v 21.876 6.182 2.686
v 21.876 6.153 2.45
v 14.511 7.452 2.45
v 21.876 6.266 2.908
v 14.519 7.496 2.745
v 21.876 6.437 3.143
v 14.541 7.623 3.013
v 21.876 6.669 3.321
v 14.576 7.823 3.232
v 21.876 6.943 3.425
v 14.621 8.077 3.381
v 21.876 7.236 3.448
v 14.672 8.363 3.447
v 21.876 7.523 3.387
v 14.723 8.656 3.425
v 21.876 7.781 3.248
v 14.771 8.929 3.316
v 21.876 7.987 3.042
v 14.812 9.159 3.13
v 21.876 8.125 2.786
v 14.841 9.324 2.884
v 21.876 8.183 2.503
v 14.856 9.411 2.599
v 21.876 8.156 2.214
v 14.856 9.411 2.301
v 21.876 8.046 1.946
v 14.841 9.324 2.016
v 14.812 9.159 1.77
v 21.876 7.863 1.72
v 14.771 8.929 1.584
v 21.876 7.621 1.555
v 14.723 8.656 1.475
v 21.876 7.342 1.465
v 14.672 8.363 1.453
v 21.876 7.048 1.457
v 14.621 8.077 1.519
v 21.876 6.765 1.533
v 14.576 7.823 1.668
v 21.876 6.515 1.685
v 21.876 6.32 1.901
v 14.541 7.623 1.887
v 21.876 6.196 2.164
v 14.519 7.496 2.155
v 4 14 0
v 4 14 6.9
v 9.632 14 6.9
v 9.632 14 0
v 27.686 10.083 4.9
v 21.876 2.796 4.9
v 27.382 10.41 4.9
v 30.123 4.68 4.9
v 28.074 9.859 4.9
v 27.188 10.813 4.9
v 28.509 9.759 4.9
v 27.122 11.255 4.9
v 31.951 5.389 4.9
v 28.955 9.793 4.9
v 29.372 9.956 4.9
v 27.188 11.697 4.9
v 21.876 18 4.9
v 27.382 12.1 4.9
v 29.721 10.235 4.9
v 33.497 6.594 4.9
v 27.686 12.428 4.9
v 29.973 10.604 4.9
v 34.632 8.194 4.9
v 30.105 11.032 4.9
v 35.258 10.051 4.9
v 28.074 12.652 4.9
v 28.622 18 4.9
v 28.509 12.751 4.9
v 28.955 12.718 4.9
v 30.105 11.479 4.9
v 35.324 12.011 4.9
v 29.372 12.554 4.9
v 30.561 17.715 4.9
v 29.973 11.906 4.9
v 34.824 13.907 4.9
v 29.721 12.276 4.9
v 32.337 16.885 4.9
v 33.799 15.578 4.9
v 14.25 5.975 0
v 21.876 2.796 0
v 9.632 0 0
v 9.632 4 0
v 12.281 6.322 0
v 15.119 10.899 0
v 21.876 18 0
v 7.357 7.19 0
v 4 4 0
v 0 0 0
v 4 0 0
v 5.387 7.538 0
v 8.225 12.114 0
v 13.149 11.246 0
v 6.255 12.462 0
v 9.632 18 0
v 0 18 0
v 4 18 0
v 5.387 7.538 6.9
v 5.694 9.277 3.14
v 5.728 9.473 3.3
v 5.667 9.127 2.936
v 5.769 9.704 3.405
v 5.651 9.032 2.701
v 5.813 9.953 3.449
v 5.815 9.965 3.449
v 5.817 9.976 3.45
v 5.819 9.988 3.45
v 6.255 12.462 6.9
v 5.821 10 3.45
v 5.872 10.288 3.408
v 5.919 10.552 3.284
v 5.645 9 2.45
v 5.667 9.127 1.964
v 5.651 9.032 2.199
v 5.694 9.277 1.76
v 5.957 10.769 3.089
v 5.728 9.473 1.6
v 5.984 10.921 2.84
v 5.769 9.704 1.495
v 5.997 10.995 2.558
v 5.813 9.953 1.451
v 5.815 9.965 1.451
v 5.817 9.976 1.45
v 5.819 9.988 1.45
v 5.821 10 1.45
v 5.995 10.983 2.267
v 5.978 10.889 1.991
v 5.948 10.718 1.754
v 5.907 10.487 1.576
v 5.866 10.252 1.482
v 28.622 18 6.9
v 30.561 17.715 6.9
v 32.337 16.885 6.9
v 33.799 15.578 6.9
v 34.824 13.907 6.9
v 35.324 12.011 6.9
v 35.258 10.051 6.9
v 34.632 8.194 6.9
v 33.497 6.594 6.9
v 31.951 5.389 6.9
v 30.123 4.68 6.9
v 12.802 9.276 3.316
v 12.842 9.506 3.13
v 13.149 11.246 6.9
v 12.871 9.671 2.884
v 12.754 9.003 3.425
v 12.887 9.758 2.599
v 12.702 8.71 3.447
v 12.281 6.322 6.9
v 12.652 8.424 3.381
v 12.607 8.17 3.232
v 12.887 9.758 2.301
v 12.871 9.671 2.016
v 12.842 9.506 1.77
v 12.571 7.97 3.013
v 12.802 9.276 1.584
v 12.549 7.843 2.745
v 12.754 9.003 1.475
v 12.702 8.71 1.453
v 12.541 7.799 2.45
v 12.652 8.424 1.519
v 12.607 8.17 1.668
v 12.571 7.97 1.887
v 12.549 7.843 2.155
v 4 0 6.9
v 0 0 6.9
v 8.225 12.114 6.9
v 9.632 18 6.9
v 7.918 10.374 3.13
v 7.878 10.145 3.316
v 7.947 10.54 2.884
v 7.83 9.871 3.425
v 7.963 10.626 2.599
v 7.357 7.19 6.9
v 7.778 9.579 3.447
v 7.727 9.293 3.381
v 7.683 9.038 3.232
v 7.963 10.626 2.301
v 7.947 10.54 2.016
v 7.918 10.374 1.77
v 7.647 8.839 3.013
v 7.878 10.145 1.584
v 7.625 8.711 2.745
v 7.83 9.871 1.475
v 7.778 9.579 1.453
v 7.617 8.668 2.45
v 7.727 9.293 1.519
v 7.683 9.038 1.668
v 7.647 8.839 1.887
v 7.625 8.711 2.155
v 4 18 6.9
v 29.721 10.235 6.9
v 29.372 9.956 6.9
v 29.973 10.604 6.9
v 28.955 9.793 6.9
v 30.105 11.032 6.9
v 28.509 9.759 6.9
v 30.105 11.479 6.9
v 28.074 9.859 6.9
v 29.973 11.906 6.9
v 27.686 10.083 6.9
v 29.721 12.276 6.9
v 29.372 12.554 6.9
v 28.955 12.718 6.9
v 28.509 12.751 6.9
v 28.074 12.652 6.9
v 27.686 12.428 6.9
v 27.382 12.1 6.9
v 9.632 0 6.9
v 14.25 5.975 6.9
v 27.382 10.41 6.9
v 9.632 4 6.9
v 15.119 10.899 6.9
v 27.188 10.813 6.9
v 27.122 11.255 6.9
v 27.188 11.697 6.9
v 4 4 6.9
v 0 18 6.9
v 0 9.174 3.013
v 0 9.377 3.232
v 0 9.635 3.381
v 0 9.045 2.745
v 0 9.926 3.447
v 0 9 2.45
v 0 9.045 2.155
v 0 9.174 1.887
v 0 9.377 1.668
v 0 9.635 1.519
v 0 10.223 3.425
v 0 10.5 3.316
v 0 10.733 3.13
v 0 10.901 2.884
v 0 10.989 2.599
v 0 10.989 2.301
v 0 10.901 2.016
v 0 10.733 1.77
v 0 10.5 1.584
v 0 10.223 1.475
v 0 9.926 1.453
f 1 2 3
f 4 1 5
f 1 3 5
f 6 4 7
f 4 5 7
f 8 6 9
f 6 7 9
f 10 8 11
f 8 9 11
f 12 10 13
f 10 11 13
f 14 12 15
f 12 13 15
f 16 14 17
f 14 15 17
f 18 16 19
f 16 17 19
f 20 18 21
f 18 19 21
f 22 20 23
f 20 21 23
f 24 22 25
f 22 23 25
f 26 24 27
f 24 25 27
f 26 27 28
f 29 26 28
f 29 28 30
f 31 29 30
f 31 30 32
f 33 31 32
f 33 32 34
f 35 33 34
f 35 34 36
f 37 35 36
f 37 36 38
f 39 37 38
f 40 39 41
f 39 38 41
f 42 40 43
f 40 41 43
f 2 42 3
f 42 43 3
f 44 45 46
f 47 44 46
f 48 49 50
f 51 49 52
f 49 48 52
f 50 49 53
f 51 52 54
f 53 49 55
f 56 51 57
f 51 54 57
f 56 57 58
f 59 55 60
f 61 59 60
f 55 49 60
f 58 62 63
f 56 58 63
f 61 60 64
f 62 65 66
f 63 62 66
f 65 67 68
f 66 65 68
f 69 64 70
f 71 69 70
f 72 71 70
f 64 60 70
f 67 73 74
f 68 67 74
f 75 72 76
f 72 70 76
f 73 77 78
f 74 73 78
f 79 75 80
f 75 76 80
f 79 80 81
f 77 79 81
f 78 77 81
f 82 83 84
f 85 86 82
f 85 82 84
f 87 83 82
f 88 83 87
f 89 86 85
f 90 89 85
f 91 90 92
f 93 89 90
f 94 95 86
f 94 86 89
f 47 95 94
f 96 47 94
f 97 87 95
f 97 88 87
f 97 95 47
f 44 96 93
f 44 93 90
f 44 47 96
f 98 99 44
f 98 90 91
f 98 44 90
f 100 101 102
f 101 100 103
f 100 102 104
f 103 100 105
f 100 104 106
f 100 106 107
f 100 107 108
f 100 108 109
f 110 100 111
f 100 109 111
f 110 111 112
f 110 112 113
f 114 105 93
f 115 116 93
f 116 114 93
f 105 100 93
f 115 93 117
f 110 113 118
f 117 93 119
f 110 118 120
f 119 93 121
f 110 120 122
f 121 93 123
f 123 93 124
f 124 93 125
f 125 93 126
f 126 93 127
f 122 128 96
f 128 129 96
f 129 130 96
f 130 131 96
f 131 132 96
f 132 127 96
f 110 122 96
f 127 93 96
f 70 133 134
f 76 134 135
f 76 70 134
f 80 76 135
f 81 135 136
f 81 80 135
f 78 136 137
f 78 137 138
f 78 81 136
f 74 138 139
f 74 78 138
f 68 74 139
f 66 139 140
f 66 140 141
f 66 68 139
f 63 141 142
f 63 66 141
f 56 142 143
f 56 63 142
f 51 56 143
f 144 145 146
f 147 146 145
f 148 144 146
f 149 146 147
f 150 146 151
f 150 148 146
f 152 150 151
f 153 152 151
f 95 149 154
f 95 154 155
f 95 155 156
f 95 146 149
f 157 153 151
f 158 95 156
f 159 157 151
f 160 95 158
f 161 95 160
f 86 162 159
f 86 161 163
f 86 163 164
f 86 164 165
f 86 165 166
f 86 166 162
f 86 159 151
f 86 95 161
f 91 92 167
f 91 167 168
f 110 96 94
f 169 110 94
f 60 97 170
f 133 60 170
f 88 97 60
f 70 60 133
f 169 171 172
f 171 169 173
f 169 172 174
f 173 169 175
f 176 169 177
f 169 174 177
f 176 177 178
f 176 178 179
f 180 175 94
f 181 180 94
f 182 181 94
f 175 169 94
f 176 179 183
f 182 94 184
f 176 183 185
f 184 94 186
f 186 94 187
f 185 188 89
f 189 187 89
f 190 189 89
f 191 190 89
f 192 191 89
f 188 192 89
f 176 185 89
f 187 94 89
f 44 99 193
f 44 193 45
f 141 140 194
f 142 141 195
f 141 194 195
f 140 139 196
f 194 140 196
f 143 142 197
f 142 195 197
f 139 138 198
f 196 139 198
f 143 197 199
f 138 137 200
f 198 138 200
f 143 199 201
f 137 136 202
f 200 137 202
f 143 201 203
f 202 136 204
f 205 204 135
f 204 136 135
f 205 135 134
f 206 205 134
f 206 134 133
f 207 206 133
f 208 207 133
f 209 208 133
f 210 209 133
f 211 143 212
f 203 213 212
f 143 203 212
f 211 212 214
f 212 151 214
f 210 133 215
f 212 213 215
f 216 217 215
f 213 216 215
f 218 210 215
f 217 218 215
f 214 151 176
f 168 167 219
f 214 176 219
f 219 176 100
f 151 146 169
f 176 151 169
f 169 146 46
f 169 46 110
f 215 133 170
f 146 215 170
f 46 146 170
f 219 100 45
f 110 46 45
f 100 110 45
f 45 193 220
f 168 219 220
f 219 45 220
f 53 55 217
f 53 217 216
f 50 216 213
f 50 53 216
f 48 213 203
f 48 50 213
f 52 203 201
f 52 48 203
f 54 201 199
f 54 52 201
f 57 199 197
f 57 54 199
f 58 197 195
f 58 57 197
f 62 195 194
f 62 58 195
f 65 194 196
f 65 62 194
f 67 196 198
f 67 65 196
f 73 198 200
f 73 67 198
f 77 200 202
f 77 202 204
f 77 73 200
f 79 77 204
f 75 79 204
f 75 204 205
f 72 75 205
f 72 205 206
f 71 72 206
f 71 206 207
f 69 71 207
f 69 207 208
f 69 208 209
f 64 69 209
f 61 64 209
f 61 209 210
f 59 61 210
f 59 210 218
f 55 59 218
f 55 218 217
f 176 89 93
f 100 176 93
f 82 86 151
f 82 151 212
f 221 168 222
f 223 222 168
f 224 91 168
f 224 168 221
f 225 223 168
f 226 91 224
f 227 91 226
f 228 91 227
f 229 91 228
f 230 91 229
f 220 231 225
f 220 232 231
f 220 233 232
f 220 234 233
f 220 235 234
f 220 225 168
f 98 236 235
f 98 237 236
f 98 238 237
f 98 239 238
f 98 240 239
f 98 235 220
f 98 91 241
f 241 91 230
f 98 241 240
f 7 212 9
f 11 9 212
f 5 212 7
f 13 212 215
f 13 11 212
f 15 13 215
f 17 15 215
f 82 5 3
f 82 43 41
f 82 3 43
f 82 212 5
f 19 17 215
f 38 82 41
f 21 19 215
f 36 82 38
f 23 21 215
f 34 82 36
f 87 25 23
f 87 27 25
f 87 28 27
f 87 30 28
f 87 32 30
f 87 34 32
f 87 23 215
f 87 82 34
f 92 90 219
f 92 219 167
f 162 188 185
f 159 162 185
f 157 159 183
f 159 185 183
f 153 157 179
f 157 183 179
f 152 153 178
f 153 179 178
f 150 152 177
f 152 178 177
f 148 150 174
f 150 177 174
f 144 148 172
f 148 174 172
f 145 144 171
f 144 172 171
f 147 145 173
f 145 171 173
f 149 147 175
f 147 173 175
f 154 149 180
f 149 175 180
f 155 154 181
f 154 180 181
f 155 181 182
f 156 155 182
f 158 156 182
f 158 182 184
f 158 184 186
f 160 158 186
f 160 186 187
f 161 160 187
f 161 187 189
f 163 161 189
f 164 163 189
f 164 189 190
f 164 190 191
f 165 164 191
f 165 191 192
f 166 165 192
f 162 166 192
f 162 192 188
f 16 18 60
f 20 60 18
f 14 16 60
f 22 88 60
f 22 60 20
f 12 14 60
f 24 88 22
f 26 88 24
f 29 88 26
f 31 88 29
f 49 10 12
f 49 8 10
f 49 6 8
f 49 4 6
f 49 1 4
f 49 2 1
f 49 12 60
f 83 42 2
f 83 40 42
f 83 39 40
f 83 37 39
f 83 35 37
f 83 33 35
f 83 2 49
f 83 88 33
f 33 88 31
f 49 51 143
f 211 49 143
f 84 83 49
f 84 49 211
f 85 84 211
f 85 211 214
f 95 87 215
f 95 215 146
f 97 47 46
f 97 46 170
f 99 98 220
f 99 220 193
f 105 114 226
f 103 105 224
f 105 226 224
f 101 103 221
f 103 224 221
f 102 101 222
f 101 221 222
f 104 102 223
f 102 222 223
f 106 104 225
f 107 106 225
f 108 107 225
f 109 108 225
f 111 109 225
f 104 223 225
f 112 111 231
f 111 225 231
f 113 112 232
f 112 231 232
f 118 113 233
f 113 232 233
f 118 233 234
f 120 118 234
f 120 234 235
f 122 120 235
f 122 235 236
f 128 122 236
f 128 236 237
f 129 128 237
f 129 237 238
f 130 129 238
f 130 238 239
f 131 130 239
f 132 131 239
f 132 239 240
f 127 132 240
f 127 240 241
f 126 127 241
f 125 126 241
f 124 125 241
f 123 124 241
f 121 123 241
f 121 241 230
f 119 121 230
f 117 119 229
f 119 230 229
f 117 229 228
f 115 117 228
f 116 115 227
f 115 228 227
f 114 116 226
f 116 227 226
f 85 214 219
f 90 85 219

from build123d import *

# Parameters (mm, degrees)
SKETCH1_R                           = 1.5
BOSS_EXTRUDE1_DEPTH                 = 6.9
CUT_EXTRUDE2_DEPTH                  = 4.9
SKETCH5_R                           = 1
CUT_EXTRUDE3_DEPTH                  = 7
CUT_EXTRUDE4_REACH                  = 37.751
SKETCH6_R                           = 1
CUT_EXTRUDE4_DIRECTION_2_REACH      = 37.751
CUT_EXTRUDE4_DIRECTION_2_END_RADIUS = 1


with BuildPart() as part:
    # Sketch1 → Boss-Extrude1 (new body)
    with BuildSketch(Plane.XY):
        with BuildLine():
            Line((0, 0), (0, 18.000341084))
            Line((0, 18.000341084), (4, 18.000341084))
            Line((4, 18.000341084), (4, 14.000341084))
            Line((4, 14.000341084), (9.631516349, 14.000341084))
            Line((9.631516349, 14.000341084), (9.631516349, 18.000341084))
            Line((9.631516349, 18.000341084), (28.621516349, 18.000341084))
            ThreePointArc((28.621516349, 18.000341084), (35.324106187, 12.010882781), (30.123176491, 4.679535592))
            Line((30.123176491, 4.679535592), (9.631516349, 0))
            Line((9.631516349, 0), (9.631516349, 4))
            Line((9.631516349, 4), (4, 4))
            Line((4, 4), (4, 0))
            Line((4, 0), (0, 0))
        make_face()
        with Locations((28.621516349, 11.255296941)):
            Circle(SKETCH1_R, mode=Mode.SUBTRACT)
        Polygon((14.250450019, 5.974769403), (15.118690908, 10.898808168), (13.149075402, 11.246104524), (12.280834513, 6.322065759), align=None, mode=Mode.SUBTRACT)
        Polygon((6.255421131, 12.461641767), (8.225036637, 12.114345412), (7.356795748, 7.190306647), (5.387180242, 7.537603002), align=None, mode=Mode.SUBTRACT)
    extrude(amount=BOSS_EXTRUDE1_DEPTH)

    # Sketch4 → Cut-Extrude2 (cut)
    with BuildSketch(Plane.XY):
        with BuildLine():
            Line((21.876472206, 2.796294022), (30.123176491, 4.679535592))
            ThreePointArc((30.123176491, 4.679535592), (35.324106187, 12.010882781), (28.621516349, 18.000341084))
            Line((28.621516349, 18.000341084), (21.876472206, 18.000341084))
            Line((21.876472206, 18.000341084), (21.876472206, 2.796294022))
        make_face()
    extrude(amount=CUT_EXTRUDE2_DEPTH, mode=Mode.SUBTRACT)

    # Sketch5 → Cut-Extrude3 (cut)
    with BuildSketch(Plane.ZY):
        with Locations((2.45, 10.000341084)):
            Circle(SKETCH5_R)
    extrude(amount=-CUT_EXTRUDE3_DEPTH, mode=Mode.SUBTRACT)

    # Cut-Extrude4: up to this plane
    cut_extrude4_end = Plane(origin=(21.876472206, 18.000341084, 4.9), z_dir=(1, 0, 0))
    # Sketch6 → Cut-Extrude4 (cut, up to the surface)
    with BuildSketch(Plane(origin=(5.905346358, -1.041271893, 0), x_dir=(0, 0, 1), z_dir=(-0.984807753012208, 0.17364817766693114, 0)), mode=Mode.PRIVATE) as cut_extrude4_sk1:
        with Locations((2.45, 10.858563908)):
            Circle(SKETCH6_R)
    cut_extrude4_tool1 = split(extrude(cut_extrude4_sk1.sketch, amount=-CUT_EXTRUDE4_REACH, mode=Mode.PRIVATE), bisect_by=cut_extrude4_end, keep=Keep.BOTH, mode=Mode.PRIVATE)
    add(cut_extrude4_tool1.solids().sort_by_distance((7.790916, 9.652326, 2.45))[0], mode=Mode.SUBTRACT)

    # Cut-Extrude4 direction 2: up to this cylinder (the profile starts inside it)
    cut_extrude4_direction_2_end = Plane(origin=(7.790916, 10.000341084, 2.45), z_dir=(-1, 0, 0)) * Cylinder(CUT_EXTRUDE4_DIRECTION_2_END_RADIUS, 78.502, mode=Mode.PRIVATE)
    # Sketch6 → Cut-Extrude4 direction 2 (cut, up to the surface)
    with BuildSketch(Plane(origin=(5.905346358, -1.041271893, 0), x_dir=(0, 0, 1), z_dir=(-0.984807753012208, 0.17364817766693114, 0)), mode=Mode.PRIVATE) as cut_extrude4_direction_2_sk1:
        with Locations((2.45, 10.858563908)):
            Circle(SKETCH6_R)
    cut_extrude4_direction_2_tool1 = extrude(cut_extrude4_direction_2_sk1.sketch, amount=CUT_EXTRUDE4_DIRECTION_2_REACH, mode=Mode.PRIVATE) & cut_extrude4_direction_2_end
    add(cut_extrude4_direction_2_tool1.solids().sort_by_distance((7.790916, 9.652326, 2.45))[0], mode=Mode.SUBTRACT)


solid = part.part
